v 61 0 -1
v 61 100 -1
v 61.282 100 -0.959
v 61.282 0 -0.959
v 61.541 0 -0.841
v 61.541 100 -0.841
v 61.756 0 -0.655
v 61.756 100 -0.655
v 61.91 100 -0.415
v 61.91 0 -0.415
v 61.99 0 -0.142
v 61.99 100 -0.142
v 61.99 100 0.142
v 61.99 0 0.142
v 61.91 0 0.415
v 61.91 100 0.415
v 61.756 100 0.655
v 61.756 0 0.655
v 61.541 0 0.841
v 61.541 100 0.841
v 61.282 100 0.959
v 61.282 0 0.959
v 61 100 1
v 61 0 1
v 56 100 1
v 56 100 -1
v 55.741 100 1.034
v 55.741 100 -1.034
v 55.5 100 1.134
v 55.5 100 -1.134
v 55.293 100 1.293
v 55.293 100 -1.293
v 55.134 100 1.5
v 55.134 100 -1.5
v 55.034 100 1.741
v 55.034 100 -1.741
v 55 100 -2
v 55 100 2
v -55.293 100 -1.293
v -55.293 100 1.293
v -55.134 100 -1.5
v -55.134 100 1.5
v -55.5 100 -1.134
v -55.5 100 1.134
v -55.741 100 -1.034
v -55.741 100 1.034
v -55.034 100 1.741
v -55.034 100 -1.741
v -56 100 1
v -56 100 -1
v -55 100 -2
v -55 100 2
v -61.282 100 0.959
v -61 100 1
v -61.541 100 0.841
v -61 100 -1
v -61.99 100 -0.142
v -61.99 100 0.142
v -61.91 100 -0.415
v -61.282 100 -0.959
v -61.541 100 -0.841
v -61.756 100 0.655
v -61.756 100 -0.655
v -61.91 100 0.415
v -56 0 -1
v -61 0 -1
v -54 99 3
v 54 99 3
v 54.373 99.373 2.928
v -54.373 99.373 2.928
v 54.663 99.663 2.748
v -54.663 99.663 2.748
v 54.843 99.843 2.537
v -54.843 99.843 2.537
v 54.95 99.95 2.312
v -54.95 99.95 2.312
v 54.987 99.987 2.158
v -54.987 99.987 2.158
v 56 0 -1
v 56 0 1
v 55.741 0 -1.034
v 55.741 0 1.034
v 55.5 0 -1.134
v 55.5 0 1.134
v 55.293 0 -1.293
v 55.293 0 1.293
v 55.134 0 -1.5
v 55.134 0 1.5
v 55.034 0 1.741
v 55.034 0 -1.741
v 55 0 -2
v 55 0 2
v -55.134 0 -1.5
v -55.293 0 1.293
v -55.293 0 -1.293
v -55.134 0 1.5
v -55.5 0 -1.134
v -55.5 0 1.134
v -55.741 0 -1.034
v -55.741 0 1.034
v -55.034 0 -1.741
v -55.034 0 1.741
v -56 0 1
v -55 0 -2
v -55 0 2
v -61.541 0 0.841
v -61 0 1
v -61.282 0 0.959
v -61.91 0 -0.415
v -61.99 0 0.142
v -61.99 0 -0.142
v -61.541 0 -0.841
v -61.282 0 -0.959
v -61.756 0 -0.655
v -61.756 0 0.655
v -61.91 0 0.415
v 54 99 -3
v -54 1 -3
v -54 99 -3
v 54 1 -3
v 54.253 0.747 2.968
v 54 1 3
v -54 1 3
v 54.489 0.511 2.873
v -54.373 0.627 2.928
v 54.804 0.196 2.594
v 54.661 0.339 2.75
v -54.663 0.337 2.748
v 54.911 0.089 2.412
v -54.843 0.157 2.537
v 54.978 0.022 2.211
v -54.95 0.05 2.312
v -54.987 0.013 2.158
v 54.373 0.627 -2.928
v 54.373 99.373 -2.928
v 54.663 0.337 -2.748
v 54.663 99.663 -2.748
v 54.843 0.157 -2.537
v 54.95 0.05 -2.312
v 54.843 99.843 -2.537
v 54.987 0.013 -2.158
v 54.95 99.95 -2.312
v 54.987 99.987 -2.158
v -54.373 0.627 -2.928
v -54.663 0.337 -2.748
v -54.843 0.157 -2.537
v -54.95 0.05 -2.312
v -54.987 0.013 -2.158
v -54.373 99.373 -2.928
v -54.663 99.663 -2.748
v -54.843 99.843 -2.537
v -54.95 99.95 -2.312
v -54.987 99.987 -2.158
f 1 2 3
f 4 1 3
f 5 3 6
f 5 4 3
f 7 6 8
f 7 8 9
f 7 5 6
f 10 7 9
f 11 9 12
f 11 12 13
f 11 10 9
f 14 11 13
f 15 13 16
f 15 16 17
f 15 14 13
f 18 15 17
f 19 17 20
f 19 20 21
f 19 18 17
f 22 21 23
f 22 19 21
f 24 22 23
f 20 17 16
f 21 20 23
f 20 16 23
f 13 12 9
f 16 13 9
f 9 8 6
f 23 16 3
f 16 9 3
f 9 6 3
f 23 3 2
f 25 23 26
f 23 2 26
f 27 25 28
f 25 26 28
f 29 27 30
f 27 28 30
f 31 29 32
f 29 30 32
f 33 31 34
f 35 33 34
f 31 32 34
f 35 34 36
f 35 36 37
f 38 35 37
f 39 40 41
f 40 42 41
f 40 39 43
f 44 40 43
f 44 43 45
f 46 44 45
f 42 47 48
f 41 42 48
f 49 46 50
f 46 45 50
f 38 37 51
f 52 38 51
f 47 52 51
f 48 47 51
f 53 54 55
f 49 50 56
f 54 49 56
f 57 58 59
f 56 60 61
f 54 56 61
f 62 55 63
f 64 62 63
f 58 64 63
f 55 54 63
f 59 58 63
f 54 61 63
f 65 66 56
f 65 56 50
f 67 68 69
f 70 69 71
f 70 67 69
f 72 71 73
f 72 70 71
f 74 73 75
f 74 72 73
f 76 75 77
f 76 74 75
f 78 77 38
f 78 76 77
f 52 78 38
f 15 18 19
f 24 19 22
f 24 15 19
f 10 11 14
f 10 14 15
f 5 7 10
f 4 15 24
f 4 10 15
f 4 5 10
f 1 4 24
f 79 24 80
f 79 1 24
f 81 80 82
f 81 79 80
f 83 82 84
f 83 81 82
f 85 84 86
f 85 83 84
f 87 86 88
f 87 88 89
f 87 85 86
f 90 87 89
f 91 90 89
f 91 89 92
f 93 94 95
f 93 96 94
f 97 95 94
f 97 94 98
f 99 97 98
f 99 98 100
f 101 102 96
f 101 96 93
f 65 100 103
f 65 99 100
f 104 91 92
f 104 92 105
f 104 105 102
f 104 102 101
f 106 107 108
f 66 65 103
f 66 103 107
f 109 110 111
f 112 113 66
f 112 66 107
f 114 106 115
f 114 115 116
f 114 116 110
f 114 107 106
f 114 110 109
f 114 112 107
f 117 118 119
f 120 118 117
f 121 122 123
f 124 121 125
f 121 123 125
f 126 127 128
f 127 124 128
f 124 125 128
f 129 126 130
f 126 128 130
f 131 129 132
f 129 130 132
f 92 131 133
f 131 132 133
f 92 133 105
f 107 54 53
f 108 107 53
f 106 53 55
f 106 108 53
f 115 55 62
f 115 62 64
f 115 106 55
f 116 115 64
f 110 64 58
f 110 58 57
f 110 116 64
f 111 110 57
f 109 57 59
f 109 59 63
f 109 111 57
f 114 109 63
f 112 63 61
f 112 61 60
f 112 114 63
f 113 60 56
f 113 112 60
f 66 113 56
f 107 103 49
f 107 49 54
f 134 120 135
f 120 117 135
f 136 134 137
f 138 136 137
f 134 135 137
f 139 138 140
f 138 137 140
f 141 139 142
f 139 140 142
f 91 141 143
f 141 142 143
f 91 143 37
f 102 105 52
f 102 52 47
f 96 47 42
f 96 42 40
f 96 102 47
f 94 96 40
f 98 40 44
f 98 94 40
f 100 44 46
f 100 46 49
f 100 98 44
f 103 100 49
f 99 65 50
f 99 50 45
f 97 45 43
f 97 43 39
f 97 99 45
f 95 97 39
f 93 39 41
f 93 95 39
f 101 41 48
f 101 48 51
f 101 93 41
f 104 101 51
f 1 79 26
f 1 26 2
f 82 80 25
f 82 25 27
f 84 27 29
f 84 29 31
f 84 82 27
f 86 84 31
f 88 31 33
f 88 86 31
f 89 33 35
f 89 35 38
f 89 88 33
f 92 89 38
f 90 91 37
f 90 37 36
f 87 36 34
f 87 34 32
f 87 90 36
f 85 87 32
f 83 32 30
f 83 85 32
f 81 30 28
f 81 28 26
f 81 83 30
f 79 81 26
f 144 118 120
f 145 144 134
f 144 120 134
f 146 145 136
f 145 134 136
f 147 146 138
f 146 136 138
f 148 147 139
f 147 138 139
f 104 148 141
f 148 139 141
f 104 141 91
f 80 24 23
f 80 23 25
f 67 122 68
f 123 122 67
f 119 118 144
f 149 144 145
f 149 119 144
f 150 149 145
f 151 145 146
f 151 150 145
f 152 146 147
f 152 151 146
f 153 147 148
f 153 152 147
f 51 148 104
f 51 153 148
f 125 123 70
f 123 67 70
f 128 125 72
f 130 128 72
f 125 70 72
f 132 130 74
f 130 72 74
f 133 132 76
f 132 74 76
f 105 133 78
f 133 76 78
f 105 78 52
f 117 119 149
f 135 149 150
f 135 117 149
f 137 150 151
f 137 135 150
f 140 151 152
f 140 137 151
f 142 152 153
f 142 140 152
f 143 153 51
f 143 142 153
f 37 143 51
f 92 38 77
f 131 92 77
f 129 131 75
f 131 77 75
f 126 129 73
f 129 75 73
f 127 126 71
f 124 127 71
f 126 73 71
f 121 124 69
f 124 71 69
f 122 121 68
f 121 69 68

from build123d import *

# Parameters (mm, degrees)
BOSS_EXTRUDE1_DEPTH = 100
FILLET1_R           = 1


with BuildPart() as part:
    # Sketch2 → Boss-Extrude1 (new body)
    with BuildSketch(Plane(origin=(0, 0, 0), x_dir=(1, 0, 0), z_dir=(0, 1, 0))):
        with BuildLine():
            Line((-55, 3), (55, 3))
            Line((55, 3), (55, 2))
            ThreePointArc((55, 2), (55.292893219, 1.292893219), (56, 1))
            Line((56, 1), (61, 1))
            ThreePointArc((61, 1), (62, 0), (61, -1))
            Line((61, -1), (56, -1))
            ThreePointArc((56, -1), (55.292893219, -1.292893219), (55, -2))
            Line((55, -2), (55, -3))
            Line((55, -3), (-55, -3))
            Line((-55, -3), (-55, -2))
            ThreePointArc((-55, -2), (-55.292893219, -1.292893219), (-56, -1))
            Line((-56, -1), (-61, -1))
            ThreePointArc((-61, -1), (-62, 0), (-61, 1))
            Line((-61, 1), (-56, 1))
            ThreePointArc((-56, 1), (-55.292893219, 1.292893219), (-55, 2))
            Line((-55, 2), (-55, 3))
        make_face()
    extrude(amount=BOSS_EXTRUDE1_DEPTH)

    # Fillet1
    fillet1_edges = [part.edges().sort_by_distance(p)[0] for p in [
        (55, 50, -3),
        (0, 100, -3),
        (-55, 50, -3),
        (0, 0, -3),
        (-55, 50, 3),
        (0, 100, 3),
        (55, 50, 3),
        (0, 0, 3),
    ]]
    fillet(fillet1_edges, radius=FILLET1_R - 0.0001)  # a hair under: the kernel refuses the full size


solid = part.part
